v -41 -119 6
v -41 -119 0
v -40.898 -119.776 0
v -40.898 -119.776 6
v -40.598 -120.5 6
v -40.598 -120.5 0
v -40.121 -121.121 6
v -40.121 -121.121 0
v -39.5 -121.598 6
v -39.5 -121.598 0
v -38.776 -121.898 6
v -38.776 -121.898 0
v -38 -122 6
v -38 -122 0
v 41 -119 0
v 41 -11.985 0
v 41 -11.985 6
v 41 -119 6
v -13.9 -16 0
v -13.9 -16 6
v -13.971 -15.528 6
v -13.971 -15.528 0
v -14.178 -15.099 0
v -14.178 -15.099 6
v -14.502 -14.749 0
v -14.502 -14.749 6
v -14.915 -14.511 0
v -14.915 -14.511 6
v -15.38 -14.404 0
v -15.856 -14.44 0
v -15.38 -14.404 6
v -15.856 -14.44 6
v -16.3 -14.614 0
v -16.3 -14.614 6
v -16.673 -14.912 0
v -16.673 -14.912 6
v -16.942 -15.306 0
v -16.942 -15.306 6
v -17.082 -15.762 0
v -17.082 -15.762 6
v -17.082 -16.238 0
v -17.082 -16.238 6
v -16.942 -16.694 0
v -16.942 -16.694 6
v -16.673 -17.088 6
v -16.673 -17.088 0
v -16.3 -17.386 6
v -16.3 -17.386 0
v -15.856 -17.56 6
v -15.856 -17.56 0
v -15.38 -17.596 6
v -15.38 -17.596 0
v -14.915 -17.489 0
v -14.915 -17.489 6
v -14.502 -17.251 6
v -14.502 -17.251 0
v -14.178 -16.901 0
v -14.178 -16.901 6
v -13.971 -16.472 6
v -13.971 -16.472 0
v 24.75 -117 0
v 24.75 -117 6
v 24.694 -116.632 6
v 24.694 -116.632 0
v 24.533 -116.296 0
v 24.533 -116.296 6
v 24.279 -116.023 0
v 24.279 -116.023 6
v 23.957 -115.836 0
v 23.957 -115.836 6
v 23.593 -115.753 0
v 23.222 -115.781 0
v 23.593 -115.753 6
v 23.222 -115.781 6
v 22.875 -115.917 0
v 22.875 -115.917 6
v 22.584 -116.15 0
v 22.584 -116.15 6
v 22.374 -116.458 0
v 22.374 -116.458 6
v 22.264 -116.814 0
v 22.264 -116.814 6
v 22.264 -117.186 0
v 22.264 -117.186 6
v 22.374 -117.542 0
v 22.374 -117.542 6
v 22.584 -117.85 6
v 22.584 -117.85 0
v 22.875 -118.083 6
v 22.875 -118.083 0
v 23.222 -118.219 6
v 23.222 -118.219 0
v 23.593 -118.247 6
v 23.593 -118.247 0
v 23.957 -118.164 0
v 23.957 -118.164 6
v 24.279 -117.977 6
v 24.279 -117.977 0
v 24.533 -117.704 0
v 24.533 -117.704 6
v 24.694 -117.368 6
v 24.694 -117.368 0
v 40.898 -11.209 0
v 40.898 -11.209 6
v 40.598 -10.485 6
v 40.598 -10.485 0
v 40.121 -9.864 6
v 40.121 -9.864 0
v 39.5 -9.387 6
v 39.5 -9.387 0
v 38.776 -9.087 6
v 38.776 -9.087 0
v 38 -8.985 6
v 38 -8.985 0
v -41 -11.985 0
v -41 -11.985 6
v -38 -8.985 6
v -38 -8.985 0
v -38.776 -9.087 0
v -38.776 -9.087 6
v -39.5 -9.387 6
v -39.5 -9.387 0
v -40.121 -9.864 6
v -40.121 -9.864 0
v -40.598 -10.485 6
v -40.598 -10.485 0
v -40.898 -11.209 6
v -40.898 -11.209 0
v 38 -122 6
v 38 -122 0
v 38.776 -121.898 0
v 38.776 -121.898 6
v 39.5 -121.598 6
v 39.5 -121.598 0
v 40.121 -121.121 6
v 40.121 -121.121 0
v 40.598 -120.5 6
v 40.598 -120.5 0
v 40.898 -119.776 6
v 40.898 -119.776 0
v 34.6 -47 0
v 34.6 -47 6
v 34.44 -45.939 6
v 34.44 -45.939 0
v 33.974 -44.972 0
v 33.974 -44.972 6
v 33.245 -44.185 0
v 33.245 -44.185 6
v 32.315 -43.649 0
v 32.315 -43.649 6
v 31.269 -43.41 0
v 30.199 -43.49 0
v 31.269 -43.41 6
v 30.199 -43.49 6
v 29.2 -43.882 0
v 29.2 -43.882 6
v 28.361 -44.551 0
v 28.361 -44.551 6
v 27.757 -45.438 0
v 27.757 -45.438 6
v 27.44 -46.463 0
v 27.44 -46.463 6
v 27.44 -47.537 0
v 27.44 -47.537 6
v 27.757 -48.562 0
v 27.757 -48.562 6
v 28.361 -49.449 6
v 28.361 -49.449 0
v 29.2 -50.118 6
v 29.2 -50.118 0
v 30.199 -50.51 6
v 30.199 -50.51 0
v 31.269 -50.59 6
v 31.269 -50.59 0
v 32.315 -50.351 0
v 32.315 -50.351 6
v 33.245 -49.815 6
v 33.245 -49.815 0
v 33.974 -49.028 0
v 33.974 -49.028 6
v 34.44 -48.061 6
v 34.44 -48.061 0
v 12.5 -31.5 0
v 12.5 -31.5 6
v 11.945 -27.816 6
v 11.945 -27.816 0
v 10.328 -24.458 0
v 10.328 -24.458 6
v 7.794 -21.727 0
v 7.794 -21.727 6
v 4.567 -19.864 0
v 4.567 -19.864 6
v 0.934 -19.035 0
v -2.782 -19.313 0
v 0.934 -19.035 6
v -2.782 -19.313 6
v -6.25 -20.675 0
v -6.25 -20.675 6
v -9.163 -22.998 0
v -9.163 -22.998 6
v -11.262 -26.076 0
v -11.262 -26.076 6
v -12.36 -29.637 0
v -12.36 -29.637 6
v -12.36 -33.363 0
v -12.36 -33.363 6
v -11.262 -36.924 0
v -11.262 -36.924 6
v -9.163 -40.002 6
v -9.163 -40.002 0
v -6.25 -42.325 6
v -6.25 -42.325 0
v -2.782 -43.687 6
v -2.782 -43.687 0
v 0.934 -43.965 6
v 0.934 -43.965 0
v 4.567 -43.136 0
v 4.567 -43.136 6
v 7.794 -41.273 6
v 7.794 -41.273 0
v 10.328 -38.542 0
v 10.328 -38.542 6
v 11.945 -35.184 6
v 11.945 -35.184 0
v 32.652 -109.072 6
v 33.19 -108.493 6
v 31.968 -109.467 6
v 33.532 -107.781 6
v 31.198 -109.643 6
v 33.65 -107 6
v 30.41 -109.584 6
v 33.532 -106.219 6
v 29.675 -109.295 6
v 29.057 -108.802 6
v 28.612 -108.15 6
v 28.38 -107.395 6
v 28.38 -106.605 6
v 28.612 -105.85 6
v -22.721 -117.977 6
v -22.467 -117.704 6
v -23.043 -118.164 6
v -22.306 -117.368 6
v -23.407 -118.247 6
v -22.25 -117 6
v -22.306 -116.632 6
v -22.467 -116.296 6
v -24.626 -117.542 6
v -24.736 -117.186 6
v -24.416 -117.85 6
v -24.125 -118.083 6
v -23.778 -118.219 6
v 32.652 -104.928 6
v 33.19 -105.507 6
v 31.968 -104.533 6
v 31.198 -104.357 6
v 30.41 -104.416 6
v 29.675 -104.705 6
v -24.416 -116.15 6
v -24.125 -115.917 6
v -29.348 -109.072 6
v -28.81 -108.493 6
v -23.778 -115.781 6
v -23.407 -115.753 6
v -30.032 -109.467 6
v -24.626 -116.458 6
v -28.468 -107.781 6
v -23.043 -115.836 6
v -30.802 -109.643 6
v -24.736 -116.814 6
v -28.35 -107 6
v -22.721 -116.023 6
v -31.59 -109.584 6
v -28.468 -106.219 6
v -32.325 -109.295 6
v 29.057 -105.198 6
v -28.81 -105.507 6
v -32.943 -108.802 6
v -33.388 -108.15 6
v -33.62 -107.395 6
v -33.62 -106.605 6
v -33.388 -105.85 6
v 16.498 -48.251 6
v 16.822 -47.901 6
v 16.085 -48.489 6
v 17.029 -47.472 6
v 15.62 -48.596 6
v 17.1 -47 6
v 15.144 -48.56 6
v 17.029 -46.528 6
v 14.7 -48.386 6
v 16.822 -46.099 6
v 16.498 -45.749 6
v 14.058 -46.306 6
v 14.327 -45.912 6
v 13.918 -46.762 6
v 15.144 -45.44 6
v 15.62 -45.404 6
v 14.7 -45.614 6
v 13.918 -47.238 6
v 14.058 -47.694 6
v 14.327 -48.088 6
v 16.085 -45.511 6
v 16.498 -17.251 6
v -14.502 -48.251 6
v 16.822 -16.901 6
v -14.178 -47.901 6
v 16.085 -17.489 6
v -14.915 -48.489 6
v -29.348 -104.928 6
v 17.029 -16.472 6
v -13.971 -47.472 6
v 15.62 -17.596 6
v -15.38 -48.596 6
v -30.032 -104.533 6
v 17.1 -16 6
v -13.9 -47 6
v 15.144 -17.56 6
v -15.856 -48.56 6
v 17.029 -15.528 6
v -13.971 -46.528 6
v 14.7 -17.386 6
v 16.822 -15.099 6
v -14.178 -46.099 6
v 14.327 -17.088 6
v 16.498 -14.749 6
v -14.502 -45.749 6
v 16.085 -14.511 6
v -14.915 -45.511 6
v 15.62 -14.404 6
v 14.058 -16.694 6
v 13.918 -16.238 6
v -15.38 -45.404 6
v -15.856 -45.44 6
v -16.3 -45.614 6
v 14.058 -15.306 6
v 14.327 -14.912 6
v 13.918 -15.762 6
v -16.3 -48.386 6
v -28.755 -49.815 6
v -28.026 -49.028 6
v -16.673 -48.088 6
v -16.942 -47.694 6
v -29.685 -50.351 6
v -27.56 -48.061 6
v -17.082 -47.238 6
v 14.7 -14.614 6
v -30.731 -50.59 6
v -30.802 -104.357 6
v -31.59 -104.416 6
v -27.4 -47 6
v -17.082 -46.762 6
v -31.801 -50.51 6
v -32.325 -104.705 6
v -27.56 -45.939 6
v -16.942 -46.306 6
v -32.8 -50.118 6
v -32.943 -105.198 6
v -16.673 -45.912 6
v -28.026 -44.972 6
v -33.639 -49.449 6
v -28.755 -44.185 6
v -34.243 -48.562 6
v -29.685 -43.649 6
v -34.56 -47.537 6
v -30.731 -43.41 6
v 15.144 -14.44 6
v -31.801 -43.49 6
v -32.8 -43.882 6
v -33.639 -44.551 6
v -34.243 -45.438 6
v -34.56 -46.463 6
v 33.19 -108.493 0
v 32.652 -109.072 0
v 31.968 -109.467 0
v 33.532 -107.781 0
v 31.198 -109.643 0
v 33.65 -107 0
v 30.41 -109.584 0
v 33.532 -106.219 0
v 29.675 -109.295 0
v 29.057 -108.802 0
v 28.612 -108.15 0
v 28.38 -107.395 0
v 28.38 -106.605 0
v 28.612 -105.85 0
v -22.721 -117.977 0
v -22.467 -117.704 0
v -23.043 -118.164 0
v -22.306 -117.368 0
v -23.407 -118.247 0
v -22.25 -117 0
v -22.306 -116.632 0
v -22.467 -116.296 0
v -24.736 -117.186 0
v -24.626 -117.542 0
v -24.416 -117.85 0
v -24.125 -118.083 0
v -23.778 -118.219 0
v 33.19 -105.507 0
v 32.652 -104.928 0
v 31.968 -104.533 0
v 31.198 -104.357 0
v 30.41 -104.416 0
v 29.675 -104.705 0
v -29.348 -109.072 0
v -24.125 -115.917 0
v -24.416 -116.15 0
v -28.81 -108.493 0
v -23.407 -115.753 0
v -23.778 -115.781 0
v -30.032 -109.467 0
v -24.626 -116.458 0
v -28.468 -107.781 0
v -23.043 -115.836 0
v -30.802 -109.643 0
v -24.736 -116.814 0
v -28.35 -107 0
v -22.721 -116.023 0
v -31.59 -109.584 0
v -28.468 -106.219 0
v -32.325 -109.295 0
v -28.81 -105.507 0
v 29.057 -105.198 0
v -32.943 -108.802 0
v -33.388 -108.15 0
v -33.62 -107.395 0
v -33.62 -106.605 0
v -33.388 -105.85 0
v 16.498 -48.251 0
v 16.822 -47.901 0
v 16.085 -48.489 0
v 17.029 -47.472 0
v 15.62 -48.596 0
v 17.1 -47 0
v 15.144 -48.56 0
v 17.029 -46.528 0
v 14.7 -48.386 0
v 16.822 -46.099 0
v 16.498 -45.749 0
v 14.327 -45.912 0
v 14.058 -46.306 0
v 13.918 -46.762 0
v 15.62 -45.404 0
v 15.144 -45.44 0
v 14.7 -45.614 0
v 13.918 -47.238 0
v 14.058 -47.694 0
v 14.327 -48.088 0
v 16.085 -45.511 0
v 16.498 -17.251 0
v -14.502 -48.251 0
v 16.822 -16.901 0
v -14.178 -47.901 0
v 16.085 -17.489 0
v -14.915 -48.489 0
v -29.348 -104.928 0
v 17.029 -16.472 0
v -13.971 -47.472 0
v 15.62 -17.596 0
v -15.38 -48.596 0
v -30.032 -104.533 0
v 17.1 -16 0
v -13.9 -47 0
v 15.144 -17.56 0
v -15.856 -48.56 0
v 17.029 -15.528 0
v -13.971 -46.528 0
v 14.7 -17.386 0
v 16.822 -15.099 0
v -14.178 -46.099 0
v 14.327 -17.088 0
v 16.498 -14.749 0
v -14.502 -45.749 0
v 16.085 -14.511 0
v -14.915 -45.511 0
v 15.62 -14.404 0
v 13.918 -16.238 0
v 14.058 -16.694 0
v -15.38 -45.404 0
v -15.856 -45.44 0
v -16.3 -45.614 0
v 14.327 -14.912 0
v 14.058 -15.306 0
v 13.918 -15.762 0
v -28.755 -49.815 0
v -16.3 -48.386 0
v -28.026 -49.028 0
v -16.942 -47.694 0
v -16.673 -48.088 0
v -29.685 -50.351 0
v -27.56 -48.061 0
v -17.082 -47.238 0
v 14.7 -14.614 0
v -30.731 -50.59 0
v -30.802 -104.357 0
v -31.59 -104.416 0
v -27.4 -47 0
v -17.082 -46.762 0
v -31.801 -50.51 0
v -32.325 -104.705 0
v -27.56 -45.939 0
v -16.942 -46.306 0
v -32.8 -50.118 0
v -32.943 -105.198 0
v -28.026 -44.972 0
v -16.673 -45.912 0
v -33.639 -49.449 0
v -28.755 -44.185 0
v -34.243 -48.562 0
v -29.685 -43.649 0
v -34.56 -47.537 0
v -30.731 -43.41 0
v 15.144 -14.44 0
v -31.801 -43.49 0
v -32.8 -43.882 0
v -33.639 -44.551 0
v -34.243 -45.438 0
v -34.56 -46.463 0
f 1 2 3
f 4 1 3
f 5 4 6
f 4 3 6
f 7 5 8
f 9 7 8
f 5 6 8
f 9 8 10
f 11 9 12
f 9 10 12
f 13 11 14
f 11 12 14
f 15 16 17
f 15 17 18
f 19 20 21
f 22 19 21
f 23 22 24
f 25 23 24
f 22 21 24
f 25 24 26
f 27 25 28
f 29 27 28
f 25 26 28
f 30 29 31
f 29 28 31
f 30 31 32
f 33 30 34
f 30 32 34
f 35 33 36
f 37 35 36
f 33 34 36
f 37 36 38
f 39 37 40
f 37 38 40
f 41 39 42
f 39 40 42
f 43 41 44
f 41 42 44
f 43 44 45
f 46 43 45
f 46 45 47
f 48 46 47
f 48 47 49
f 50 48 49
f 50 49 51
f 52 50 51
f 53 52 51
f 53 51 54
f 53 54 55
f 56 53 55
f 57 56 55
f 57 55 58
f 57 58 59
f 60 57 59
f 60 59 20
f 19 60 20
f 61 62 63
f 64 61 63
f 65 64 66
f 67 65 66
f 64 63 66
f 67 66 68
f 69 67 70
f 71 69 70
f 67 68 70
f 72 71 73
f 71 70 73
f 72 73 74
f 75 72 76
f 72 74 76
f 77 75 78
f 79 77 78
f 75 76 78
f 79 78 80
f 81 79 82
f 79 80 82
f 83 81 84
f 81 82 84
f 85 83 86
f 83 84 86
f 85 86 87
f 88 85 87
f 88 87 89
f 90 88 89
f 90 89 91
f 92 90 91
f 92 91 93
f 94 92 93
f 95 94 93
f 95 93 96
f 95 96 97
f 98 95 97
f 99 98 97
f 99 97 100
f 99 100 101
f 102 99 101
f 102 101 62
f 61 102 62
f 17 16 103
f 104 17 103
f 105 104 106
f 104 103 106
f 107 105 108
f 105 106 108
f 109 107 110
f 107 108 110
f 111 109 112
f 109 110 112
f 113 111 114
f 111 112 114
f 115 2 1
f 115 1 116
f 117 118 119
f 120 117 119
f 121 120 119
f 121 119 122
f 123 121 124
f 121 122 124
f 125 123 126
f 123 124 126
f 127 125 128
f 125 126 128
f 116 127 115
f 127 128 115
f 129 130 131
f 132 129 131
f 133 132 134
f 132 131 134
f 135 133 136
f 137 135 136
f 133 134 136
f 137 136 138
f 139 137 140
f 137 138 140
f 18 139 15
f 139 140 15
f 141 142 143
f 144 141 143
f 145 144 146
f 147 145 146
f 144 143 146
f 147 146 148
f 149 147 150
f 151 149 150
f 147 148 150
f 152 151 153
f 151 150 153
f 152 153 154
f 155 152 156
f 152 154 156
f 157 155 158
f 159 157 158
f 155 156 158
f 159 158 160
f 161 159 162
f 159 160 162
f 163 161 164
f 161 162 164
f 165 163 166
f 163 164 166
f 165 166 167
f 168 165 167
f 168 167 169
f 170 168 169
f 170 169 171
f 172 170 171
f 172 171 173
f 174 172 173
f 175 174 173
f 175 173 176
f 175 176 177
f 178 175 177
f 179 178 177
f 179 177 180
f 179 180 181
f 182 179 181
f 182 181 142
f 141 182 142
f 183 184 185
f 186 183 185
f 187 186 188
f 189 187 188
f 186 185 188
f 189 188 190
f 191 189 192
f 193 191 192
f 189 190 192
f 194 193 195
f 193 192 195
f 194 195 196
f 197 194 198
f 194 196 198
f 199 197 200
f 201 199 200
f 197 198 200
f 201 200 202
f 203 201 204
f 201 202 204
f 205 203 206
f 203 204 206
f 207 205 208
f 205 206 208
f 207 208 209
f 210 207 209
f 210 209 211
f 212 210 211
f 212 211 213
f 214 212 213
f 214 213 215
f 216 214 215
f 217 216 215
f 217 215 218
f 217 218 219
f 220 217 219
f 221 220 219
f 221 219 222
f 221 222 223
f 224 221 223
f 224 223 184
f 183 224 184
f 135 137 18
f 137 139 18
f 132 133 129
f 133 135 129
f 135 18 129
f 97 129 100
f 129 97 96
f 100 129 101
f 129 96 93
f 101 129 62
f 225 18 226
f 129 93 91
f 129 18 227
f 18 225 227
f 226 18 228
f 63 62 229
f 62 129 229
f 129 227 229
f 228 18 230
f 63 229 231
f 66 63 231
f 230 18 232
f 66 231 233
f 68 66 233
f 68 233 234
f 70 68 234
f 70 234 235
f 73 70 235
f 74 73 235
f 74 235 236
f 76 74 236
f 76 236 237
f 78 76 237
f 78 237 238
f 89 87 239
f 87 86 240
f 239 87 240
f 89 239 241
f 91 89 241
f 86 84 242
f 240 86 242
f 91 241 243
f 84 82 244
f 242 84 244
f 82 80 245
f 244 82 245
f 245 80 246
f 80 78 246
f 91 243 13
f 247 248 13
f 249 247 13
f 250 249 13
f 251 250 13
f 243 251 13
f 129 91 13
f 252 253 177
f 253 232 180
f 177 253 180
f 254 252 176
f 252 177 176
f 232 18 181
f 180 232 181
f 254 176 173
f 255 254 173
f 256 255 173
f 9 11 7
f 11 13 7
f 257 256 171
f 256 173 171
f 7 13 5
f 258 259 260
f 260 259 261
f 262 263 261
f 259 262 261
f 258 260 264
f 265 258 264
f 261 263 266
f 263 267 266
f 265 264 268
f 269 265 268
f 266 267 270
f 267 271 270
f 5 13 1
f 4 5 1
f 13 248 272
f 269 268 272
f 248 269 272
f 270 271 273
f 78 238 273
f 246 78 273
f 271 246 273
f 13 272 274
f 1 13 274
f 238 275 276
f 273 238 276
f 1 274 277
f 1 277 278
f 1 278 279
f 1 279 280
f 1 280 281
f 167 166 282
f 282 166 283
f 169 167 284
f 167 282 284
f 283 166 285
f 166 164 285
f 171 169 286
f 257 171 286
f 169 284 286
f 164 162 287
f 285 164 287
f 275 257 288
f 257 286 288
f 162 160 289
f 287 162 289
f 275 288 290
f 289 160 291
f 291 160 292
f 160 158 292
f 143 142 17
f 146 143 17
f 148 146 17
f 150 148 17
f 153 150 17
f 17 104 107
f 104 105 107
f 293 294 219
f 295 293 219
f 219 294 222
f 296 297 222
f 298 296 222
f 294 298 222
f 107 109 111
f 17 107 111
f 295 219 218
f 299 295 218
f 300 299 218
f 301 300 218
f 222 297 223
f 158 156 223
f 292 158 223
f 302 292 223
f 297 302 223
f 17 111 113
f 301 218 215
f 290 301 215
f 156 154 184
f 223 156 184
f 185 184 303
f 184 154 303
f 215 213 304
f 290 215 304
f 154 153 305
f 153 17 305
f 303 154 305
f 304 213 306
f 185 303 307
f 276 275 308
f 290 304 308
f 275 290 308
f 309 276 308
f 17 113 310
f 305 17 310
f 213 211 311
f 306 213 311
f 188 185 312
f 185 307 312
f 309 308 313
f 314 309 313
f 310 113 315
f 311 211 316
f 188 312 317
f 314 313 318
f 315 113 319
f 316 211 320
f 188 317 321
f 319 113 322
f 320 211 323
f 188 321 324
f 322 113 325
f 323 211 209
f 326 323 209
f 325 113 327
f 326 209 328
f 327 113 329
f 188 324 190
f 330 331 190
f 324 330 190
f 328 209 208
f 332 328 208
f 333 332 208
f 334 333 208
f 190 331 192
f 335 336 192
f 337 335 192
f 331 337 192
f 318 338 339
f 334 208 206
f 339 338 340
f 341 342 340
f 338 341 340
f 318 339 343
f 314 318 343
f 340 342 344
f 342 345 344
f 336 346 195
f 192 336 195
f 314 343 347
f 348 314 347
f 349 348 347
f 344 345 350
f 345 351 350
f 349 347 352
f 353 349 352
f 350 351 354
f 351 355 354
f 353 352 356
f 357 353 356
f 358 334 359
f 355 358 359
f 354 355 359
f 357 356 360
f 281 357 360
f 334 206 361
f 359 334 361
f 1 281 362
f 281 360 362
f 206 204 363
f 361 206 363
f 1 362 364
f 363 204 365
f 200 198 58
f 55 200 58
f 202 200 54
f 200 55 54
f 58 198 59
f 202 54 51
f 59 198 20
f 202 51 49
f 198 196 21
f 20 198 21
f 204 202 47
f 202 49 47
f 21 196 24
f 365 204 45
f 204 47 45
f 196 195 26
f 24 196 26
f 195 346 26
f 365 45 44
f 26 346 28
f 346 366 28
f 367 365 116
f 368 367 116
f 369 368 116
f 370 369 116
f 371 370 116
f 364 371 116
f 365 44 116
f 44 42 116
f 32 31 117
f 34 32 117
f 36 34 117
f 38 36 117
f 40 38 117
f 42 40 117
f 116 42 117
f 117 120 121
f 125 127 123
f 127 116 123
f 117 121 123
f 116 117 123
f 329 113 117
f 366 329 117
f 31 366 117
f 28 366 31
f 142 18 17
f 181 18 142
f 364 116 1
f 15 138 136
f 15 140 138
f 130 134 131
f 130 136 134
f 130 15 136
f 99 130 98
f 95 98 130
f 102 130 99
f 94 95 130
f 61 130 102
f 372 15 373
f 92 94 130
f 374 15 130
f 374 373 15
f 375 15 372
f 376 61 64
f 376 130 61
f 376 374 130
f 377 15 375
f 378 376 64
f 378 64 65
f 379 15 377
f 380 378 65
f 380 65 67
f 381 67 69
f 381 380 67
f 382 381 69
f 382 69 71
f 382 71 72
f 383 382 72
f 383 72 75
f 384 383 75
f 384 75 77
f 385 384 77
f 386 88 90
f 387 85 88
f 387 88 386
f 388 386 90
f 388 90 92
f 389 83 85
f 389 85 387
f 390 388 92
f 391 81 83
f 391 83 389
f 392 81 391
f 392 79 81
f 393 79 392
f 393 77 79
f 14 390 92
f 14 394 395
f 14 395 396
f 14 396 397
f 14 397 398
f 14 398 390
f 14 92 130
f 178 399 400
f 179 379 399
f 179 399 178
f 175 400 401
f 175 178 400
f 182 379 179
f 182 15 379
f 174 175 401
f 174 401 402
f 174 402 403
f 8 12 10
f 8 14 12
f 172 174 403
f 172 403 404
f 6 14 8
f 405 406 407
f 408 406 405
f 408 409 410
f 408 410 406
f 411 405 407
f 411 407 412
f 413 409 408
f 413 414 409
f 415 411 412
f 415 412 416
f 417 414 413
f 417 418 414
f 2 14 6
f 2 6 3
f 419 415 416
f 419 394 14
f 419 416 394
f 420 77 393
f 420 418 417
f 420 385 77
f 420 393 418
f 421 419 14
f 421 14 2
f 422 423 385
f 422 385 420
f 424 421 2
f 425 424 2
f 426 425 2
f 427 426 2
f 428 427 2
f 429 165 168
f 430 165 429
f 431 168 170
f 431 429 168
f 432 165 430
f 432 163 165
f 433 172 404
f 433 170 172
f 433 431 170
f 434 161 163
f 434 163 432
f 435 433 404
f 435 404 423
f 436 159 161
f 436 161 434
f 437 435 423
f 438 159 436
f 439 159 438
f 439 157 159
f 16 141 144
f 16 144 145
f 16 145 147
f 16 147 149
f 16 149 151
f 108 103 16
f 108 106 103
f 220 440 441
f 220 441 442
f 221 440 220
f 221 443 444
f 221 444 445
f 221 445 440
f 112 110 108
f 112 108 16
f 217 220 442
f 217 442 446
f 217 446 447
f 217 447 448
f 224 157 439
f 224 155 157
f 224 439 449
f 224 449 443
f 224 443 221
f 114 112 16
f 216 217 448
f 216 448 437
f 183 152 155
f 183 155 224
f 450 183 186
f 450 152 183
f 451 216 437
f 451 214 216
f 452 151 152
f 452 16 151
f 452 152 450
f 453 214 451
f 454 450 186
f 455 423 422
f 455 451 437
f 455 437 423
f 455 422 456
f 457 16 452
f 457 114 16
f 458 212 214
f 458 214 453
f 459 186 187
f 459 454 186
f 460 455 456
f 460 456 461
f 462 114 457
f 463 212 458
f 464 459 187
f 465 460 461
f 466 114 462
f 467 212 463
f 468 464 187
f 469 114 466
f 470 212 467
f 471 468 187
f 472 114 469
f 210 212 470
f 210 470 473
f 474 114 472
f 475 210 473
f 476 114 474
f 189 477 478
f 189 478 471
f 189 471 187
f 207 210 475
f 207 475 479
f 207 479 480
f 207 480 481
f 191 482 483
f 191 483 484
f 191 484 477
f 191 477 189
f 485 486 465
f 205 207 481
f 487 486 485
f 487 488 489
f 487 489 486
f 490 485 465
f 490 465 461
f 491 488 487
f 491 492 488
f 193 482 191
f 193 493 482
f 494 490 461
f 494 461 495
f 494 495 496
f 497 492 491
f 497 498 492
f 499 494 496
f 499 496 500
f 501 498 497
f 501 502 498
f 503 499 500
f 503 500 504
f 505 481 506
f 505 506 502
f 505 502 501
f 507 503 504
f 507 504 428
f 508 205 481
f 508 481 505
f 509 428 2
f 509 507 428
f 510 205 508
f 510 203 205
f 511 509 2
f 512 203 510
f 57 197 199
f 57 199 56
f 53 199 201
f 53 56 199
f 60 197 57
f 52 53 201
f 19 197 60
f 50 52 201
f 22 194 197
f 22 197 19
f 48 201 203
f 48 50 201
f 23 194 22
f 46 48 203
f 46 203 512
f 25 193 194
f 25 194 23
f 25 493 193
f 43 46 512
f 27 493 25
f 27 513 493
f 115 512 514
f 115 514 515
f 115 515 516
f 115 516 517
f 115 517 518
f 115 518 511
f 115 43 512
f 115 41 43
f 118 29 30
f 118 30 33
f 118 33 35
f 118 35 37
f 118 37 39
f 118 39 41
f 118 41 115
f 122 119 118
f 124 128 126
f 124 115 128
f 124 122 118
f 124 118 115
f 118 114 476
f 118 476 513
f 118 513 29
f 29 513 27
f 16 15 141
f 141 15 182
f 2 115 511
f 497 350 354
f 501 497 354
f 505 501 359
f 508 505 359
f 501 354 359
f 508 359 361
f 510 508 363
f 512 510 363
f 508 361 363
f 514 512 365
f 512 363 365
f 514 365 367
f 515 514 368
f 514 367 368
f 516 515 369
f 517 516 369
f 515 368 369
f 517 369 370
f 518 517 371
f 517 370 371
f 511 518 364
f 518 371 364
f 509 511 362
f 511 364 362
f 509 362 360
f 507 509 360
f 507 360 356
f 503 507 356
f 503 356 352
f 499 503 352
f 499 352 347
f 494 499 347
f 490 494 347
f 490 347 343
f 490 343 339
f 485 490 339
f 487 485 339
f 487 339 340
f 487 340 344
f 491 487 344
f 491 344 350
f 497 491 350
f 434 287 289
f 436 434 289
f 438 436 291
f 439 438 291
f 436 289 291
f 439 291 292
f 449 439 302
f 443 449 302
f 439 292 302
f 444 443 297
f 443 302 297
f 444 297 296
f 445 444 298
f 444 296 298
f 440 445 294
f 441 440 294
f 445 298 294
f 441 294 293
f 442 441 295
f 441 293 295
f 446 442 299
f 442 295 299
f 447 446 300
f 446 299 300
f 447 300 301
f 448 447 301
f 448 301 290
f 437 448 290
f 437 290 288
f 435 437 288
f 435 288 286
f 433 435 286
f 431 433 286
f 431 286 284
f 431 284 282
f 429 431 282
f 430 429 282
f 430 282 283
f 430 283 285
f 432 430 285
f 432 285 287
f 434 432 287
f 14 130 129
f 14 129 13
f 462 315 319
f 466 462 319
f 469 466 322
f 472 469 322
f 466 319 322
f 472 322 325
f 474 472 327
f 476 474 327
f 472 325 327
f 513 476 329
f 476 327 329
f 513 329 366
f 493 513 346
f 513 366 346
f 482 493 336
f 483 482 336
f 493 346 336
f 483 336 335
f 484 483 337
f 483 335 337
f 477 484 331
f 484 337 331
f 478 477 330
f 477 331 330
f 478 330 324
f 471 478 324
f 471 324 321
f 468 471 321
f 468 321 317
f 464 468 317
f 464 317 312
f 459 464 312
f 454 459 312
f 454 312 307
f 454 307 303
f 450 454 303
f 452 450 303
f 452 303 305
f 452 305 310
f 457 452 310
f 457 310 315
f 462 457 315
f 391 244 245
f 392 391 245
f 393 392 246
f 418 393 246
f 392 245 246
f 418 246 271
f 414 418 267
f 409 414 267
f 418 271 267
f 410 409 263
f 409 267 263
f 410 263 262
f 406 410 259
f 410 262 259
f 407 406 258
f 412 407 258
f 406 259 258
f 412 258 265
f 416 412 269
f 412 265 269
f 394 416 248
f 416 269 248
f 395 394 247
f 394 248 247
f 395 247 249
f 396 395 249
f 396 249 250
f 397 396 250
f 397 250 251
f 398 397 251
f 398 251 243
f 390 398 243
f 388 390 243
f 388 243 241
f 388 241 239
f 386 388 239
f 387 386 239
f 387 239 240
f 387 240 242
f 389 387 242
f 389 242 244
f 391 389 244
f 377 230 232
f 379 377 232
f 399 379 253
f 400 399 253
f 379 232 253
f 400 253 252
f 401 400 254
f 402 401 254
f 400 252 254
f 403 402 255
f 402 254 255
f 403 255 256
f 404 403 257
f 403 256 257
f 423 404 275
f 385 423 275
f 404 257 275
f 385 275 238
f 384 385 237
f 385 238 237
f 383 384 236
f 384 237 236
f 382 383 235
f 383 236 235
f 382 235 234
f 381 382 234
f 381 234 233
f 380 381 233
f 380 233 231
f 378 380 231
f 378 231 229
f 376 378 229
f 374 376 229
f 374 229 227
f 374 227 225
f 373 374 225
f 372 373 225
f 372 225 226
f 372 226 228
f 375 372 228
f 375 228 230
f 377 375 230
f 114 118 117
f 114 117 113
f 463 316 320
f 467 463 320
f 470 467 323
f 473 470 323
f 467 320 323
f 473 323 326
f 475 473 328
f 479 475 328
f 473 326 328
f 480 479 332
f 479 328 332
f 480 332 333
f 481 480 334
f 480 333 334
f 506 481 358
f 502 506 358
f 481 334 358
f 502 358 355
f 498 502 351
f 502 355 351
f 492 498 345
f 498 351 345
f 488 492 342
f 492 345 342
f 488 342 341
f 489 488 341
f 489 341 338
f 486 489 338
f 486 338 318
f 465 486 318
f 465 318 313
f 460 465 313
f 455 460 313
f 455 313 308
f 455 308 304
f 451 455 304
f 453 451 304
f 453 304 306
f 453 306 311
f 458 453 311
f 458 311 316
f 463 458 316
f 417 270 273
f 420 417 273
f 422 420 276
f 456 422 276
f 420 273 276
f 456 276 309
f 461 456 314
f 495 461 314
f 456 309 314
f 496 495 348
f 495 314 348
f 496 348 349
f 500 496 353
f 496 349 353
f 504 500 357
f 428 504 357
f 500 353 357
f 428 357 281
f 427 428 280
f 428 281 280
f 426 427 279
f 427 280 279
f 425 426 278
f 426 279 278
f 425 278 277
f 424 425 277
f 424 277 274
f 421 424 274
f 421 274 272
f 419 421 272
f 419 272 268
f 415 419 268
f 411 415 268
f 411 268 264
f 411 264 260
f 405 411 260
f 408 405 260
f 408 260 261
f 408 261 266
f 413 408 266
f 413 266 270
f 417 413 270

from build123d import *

# Parameters (mm, degrees)
PAD010_DEPTH    = 6
SKETCH047_R     = 1.6
HOLE028_DEPTH   = 25
SKETCH050_R     = 12.5
POCKET006_DEPTH = 6.001
SKETCH048_R     = 3.6
HOLE029_DEPTH   = 25
SKETCH049_R     = 2.65
HOLE030_DEPTH   = 25
SKETCH063_R     = 1.25
HOLE032_DEPTH   = 25


with BuildPart() as part:
    # Sketch060 → Pad010 (new body)
    with BuildSketch(Plane.XY):
        with BuildLine():
            Line((-38, -8.985199), (38, -8.985199))
            ThreePointArc((41, -11.985199), (40.12132, -9.863879), (38, -8.985199))
            Line((41, -11.985199), (41, -119))
            ThreePointArc((38, -122), (40.12132, -121.12132), (41, -119))
            Line((38, -122), (-38, -122))
            ThreePointArc((-41, -119), (-40.12132, -121.12132), (-38, -122))
            Line((-41, -119), (-41, -11.985199))
            ThreePointArc((-38, -8.985199), (-40.12132, -9.863879), (-41, -11.985199))
        make_face()
    extrude(amount=PAD010_DEPTH)

    # Sketch047 (on Face10 of Pad010) → Hole028 (cut)
    with BuildSketch(Plane.XY.offset(6)):
        with Locations((-15.5, -16)):
            Circle(SKETCH047_R)
        with Locations((-15.5, -47)):
            Circle(SKETCH047_R)
        with Locations((15.5, -16)):
            Circle(SKETCH047_R)
        with Locations((15.5, -47)):
            Circle(SKETCH047_R)
    extrude(amount=-HOLE028_DEPTH, mode=Mode.SUBTRACT)

    # Sketch050 (on Face5 of Hole028) → Pocket006 (cut, through all)
    with BuildSketch(Plane.XY.offset(6)):
        with Locations((0, -31.5)):
            Circle(SKETCH050_R)
    extrude(amount=-POCKET006_DEPTH, mode=Mode.SUBTRACT)

    # Sketch048 (on Face5 of Pocket006) → Hole029 (cut)
    with BuildSketch(Plane.XY.offset(6)):
        with Locations((31, -47)):
            Circle(SKETCH048_R)
        with Locations((-31, -47)):
            Circle(SKETCH048_R)
    extrude(amount=-HOLE029_DEPTH, mode=Mode.SUBTRACT)

    # Sketch049 (on Face5 of Hole029) → Hole030 (cut)
    with BuildSketch(Plane.XY.offset(6)):
        with Locations((-31, -107)):
            Circle(SKETCH049_R)
        with Locations((31, -107)):
            Circle(SKETCH049_R)
    extrude(amount=-HOLE030_DEPTH, mode=Mode.SUBTRACT)

    # Sketch063 (on Face5 of Hole030) → Hole032 (cut)
    with BuildSketch(Plane.XY.offset(6)):
        with Locations((-23.5, -117)):
            Circle(SKETCH063_R)
        with Locations((23.5, -117)):
            Circle(SKETCH063_R)
    extrude(amount=-HOLE032_DEPTH, mode=Mode.SUBTRACT)


solid = part.part
